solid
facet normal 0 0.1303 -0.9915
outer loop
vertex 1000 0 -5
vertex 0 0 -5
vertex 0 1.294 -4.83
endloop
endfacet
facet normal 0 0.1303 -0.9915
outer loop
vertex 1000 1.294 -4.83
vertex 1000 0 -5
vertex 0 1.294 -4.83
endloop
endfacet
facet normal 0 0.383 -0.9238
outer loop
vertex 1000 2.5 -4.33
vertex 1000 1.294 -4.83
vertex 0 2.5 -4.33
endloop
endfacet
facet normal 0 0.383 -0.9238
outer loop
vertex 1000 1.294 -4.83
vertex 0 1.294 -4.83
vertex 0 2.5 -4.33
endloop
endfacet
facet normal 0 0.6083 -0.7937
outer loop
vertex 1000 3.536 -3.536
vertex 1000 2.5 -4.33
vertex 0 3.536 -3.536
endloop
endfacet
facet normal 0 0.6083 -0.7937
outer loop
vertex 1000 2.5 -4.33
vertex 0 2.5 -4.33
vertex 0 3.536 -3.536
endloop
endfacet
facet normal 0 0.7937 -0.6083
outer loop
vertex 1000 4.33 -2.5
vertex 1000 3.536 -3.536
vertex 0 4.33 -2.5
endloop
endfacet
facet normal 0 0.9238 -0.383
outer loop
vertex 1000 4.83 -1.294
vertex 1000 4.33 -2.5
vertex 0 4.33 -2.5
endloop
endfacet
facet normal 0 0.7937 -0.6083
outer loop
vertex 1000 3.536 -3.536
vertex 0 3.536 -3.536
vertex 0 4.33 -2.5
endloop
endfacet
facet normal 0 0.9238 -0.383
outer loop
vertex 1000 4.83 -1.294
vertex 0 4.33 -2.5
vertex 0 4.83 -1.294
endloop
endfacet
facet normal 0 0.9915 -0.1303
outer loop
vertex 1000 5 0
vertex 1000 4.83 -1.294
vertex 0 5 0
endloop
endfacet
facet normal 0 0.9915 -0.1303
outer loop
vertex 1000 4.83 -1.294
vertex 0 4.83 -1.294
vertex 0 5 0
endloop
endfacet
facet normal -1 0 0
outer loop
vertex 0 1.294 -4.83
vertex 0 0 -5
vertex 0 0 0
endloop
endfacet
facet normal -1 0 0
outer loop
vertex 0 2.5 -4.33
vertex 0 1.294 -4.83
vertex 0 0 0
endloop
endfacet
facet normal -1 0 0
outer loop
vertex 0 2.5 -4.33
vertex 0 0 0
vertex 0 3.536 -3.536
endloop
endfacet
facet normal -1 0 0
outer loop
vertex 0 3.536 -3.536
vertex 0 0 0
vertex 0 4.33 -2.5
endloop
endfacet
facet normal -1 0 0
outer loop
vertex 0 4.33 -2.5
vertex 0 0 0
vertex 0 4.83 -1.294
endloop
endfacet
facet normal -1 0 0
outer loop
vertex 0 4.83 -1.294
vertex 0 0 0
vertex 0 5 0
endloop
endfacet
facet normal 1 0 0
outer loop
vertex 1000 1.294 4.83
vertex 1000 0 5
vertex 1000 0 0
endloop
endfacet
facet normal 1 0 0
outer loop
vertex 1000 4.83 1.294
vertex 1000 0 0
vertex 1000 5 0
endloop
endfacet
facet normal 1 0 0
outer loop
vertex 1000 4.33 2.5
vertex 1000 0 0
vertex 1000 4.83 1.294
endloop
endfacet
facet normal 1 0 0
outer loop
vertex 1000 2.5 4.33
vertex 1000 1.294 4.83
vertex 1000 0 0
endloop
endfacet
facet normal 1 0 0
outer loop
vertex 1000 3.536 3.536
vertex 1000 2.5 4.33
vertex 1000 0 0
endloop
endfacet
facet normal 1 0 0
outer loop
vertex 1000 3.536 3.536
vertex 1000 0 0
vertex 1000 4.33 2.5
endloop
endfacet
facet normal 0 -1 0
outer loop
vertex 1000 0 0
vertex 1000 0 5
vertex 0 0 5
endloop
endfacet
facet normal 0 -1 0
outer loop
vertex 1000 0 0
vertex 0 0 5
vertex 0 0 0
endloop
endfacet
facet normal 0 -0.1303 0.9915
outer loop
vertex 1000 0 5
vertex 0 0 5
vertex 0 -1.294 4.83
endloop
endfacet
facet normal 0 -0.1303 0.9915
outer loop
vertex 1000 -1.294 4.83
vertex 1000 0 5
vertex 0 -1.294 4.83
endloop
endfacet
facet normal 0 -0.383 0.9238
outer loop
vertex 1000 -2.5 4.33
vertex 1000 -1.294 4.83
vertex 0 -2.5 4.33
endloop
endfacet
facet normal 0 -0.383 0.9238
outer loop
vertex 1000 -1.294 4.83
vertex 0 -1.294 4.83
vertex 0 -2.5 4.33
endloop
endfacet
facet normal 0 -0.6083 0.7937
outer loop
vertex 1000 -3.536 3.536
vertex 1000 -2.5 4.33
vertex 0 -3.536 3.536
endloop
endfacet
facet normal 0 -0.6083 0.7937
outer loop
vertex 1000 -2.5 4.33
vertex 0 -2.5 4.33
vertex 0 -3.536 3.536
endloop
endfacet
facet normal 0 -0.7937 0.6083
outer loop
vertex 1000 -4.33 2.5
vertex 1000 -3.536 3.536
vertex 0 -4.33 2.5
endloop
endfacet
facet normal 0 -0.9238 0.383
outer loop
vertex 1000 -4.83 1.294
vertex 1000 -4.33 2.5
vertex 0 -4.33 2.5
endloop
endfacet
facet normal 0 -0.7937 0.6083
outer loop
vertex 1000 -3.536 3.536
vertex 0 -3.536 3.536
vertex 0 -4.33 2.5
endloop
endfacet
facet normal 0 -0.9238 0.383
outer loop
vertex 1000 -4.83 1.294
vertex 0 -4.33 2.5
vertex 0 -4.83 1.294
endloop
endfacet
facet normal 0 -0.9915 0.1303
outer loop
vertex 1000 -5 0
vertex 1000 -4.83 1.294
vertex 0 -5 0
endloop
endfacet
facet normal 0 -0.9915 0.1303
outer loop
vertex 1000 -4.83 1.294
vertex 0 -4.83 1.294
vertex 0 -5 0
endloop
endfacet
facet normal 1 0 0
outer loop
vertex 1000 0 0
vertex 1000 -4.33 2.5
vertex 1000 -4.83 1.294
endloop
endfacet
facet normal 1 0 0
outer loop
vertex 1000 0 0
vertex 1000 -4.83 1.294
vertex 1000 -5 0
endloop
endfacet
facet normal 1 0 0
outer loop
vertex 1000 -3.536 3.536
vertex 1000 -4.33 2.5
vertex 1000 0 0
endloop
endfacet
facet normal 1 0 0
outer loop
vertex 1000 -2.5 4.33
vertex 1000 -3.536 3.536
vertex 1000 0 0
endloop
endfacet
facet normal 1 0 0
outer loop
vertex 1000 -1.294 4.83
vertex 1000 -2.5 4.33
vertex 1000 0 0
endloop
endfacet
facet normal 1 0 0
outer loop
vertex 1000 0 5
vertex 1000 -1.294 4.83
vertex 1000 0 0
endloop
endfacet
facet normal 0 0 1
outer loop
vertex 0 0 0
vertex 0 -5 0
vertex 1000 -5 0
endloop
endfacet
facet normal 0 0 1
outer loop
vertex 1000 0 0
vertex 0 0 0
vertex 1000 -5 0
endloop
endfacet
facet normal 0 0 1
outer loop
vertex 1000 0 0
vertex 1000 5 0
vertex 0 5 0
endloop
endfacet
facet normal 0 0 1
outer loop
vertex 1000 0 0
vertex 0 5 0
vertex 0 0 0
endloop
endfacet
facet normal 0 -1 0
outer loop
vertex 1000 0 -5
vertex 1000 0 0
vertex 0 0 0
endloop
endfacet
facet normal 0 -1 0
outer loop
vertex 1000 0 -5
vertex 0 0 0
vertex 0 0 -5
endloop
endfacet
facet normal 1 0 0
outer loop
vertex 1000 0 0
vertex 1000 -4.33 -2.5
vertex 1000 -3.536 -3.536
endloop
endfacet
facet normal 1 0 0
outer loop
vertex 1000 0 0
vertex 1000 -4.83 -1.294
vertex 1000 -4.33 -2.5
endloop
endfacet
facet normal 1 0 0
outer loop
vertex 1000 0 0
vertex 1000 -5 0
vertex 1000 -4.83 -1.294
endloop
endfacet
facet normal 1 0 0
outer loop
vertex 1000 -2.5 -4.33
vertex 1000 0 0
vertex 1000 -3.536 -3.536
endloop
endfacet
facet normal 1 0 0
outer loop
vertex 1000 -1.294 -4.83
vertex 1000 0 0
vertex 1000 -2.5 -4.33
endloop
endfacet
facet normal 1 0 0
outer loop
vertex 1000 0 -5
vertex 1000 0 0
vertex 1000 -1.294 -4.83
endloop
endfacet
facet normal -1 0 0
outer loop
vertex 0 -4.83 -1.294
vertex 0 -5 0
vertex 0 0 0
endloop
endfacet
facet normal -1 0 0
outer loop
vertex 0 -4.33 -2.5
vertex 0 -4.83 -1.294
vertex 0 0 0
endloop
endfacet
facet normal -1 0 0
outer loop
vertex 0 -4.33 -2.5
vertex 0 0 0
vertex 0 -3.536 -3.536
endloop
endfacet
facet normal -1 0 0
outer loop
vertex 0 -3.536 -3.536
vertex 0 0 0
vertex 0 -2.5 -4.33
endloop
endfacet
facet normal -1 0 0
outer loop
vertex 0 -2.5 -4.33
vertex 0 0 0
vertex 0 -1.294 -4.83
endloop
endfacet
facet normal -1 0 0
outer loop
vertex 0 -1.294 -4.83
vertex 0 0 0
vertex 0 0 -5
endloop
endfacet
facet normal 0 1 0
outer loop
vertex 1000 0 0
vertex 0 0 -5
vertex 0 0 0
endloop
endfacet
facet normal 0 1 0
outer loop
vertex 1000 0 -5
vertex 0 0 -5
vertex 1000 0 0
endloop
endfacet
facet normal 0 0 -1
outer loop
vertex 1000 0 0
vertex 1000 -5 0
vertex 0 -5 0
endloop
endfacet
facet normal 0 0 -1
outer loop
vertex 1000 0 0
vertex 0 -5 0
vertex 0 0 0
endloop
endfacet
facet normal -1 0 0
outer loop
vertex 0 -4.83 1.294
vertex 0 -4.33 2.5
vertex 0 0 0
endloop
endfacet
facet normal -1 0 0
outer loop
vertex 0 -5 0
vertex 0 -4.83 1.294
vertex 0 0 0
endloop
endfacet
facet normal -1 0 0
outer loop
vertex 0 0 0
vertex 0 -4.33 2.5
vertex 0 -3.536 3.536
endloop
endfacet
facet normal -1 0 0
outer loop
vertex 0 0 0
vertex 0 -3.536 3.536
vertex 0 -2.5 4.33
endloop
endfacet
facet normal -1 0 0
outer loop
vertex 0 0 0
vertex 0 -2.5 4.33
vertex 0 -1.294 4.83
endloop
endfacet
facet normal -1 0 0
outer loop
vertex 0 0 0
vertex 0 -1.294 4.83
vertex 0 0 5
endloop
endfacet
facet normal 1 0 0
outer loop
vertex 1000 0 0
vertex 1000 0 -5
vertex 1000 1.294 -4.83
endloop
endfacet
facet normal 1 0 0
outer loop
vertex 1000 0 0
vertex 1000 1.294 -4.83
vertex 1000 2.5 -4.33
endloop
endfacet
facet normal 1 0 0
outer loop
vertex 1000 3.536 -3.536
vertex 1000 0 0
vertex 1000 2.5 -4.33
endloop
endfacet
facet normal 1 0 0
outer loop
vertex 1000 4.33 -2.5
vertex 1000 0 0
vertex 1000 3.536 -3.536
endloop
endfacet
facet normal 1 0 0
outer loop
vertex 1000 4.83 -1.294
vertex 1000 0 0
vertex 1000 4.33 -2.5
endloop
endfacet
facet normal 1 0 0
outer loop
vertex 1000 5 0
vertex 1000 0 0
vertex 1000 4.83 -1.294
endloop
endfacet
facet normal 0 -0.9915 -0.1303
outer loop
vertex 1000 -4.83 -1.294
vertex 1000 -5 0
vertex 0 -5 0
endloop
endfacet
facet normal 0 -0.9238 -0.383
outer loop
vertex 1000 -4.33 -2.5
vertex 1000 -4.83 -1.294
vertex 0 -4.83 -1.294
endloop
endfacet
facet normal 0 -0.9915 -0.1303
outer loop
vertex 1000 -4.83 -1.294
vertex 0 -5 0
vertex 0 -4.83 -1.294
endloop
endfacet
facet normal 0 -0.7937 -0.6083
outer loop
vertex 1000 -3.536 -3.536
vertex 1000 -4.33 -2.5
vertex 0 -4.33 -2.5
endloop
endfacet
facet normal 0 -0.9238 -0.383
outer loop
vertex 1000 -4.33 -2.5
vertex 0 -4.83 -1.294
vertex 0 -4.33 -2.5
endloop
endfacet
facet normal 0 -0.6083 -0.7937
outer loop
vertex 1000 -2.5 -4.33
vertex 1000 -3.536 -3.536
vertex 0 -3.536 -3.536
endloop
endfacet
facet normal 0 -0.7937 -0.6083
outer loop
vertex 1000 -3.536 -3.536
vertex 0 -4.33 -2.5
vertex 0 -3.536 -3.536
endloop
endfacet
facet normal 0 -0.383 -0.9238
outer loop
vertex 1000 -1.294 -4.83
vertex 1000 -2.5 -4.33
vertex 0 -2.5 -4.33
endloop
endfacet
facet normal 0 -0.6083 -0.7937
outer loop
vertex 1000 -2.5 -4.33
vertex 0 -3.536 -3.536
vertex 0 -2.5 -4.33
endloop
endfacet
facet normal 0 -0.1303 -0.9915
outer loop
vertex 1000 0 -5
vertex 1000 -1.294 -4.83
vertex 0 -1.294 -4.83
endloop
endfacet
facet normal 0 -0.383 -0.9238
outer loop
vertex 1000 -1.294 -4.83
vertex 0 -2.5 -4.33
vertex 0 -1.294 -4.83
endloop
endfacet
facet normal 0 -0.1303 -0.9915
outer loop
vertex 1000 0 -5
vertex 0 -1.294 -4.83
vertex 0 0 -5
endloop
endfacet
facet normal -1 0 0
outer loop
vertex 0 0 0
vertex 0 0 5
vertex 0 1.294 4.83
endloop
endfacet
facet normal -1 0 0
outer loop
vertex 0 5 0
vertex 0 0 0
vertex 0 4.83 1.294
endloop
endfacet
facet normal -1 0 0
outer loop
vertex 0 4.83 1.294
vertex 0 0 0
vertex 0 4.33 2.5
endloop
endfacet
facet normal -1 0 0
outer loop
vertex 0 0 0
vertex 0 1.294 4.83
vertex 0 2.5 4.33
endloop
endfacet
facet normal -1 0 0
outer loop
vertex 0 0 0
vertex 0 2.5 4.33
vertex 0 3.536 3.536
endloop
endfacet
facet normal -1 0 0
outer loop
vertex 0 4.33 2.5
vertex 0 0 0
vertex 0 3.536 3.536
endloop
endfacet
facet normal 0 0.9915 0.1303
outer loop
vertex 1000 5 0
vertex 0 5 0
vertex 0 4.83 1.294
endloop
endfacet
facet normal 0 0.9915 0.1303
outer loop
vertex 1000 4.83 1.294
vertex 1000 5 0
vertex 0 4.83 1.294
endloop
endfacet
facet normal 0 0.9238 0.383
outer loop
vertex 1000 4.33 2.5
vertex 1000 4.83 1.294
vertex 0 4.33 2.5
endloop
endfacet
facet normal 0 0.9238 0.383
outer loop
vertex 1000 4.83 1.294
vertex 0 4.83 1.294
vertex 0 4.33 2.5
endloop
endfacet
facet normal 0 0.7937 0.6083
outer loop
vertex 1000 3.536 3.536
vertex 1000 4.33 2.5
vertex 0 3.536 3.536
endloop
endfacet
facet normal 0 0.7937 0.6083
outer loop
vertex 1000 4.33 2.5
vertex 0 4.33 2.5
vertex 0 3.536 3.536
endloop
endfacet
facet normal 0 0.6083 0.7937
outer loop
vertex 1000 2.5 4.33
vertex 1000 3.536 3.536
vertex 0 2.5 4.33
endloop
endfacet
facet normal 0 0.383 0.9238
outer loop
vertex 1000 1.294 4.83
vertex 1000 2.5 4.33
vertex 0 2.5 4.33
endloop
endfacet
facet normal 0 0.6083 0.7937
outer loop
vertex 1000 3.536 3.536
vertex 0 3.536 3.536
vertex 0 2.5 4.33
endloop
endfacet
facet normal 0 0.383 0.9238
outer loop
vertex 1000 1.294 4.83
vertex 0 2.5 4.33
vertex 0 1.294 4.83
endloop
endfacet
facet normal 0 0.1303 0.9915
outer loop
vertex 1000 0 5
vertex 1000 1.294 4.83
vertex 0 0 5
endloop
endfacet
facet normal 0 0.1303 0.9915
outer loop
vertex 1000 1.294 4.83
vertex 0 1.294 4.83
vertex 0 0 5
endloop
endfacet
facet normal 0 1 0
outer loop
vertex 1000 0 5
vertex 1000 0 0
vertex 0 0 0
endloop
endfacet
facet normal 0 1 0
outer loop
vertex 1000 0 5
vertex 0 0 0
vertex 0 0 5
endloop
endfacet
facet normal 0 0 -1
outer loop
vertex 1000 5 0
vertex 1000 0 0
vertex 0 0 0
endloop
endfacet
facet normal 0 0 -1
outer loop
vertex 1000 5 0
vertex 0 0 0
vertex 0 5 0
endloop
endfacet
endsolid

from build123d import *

# Parameters (mm, degrees)
SKETCH_1_R                 = 5
EXTRUDE_1_DEPTH            = 1000
SPLIT_START                = -5.0000001
SPLIT_BODIES_1_OUTLINE_W   = 1000
SPLIT_BODIES_1_OUTLINE_H   = 6
SPLIT_BODIES_1_DEPTH       = 10.0000001
SPLIT_BODIES_1_2_OUTLINE_W = 1000
SPLIT_BODIES_1_2_OUTLINE_H = 6
SPLIT_BODIES_1_2_DEPTH     = 5
SPLIT_BODIES_1_3_DEPTH     = 1000
SPLIT_BODIES_1_4_DEPTH     = 1000
SPLIT_BODIES_1_5_DEPTH     = 1000


# Read off the part's stored shape, not the designer's step: Разделить1
with BuildPart() as part:
    # Эскиз1 → Бобышка-Вытянуть1 (new body)
    with BuildSketch(Plane(origin=(0, 0, 0), x_dir=(0, 0, -1), z_dir=(1, 0, 0))):
        Circle(SKETCH_1_R)
    extrude(amount=EXTRUDE_1_DEPTH)

    # Split Bodies 1 outline → Split Bodies 1 (cut)
    with BuildSketch(Plane(origin=(0, 0, 0), x_dir=(1, 0, 0), z_dir=(0, 1, 0)).offset(SPLIT_START)):
        with Locations((500, -3)):
            Rectangle(SPLIT_BODIES_1_OUTLINE_W, SPLIT_BODIES_1_OUTLINE_H)
    extrude(amount=SPLIT_BODIES_1_DEPTH, mode=Mode.SUBTRACT)

    # Split Bodies 1 2 outline → Split Bodies 1 2 (cut)
    with BuildSketch(Plane(origin=(0, 0, 0), x_dir=(1, 0, 0), z_dir=(0, 1, 0))):
        with Locations((500, 3)):
            Rectangle(SPLIT_BODIES_1_2_OUTLINE_W, SPLIT_BODIES_1_2_OUTLINE_H)
    extrude(amount=SPLIT_BODIES_1_2_DEPTH, mode=Mode.SUBTRACT)


with BuildPart() as body_2:
    # Split Bodies 1 3 outline → Split Bodies 1 3 (new body)
    with BuildSketch(Plane.YZ):
        with BuildLine():
            Line((0, 5), (0, 0))
            Line((0, 0), (5, 0))
            ThreePointArc((5, 0), (3.535533906, 3.535533906), (0, 5))
        make_face()
    extrude(amount=SPLIT_BODIES_1_3_DEPTH)


with BuildPart() as body_3:
    # Split Bodies 1 4 outline → Split Bodies 1 4 (new body)
    with BuildSketch(Plane.YZ):
        with BuildLine():
            Line((-5, 0), (0, 0))
            Line((0, 0), (0, 5))
            ThreePointArc((0, 5), (-3.535533906, 3.535533906), (-5, 0))
        make_face()
    extrude(amount=SPLIT_BODIES_1_4_DEPTH)


with BuildPart() as body_4:
    # Split Bodies 1 5 outline → Split Bodies 1 5 (new body)
    with BuildSketch(Plane.YZ):
        with BuildLine():
            Line((0, 0), (0, -5))
            ThreePointArc((0, -5), (3.535533906, -3.535533906), (5, 0))
            Line((5, 0), (0, 0))
        make_face()
    extrude(amount=SPLIT_BODIES_1_5_DEPTH)


solid = Compound([part.part, body_2.part, body_3.part, body_4.part])
